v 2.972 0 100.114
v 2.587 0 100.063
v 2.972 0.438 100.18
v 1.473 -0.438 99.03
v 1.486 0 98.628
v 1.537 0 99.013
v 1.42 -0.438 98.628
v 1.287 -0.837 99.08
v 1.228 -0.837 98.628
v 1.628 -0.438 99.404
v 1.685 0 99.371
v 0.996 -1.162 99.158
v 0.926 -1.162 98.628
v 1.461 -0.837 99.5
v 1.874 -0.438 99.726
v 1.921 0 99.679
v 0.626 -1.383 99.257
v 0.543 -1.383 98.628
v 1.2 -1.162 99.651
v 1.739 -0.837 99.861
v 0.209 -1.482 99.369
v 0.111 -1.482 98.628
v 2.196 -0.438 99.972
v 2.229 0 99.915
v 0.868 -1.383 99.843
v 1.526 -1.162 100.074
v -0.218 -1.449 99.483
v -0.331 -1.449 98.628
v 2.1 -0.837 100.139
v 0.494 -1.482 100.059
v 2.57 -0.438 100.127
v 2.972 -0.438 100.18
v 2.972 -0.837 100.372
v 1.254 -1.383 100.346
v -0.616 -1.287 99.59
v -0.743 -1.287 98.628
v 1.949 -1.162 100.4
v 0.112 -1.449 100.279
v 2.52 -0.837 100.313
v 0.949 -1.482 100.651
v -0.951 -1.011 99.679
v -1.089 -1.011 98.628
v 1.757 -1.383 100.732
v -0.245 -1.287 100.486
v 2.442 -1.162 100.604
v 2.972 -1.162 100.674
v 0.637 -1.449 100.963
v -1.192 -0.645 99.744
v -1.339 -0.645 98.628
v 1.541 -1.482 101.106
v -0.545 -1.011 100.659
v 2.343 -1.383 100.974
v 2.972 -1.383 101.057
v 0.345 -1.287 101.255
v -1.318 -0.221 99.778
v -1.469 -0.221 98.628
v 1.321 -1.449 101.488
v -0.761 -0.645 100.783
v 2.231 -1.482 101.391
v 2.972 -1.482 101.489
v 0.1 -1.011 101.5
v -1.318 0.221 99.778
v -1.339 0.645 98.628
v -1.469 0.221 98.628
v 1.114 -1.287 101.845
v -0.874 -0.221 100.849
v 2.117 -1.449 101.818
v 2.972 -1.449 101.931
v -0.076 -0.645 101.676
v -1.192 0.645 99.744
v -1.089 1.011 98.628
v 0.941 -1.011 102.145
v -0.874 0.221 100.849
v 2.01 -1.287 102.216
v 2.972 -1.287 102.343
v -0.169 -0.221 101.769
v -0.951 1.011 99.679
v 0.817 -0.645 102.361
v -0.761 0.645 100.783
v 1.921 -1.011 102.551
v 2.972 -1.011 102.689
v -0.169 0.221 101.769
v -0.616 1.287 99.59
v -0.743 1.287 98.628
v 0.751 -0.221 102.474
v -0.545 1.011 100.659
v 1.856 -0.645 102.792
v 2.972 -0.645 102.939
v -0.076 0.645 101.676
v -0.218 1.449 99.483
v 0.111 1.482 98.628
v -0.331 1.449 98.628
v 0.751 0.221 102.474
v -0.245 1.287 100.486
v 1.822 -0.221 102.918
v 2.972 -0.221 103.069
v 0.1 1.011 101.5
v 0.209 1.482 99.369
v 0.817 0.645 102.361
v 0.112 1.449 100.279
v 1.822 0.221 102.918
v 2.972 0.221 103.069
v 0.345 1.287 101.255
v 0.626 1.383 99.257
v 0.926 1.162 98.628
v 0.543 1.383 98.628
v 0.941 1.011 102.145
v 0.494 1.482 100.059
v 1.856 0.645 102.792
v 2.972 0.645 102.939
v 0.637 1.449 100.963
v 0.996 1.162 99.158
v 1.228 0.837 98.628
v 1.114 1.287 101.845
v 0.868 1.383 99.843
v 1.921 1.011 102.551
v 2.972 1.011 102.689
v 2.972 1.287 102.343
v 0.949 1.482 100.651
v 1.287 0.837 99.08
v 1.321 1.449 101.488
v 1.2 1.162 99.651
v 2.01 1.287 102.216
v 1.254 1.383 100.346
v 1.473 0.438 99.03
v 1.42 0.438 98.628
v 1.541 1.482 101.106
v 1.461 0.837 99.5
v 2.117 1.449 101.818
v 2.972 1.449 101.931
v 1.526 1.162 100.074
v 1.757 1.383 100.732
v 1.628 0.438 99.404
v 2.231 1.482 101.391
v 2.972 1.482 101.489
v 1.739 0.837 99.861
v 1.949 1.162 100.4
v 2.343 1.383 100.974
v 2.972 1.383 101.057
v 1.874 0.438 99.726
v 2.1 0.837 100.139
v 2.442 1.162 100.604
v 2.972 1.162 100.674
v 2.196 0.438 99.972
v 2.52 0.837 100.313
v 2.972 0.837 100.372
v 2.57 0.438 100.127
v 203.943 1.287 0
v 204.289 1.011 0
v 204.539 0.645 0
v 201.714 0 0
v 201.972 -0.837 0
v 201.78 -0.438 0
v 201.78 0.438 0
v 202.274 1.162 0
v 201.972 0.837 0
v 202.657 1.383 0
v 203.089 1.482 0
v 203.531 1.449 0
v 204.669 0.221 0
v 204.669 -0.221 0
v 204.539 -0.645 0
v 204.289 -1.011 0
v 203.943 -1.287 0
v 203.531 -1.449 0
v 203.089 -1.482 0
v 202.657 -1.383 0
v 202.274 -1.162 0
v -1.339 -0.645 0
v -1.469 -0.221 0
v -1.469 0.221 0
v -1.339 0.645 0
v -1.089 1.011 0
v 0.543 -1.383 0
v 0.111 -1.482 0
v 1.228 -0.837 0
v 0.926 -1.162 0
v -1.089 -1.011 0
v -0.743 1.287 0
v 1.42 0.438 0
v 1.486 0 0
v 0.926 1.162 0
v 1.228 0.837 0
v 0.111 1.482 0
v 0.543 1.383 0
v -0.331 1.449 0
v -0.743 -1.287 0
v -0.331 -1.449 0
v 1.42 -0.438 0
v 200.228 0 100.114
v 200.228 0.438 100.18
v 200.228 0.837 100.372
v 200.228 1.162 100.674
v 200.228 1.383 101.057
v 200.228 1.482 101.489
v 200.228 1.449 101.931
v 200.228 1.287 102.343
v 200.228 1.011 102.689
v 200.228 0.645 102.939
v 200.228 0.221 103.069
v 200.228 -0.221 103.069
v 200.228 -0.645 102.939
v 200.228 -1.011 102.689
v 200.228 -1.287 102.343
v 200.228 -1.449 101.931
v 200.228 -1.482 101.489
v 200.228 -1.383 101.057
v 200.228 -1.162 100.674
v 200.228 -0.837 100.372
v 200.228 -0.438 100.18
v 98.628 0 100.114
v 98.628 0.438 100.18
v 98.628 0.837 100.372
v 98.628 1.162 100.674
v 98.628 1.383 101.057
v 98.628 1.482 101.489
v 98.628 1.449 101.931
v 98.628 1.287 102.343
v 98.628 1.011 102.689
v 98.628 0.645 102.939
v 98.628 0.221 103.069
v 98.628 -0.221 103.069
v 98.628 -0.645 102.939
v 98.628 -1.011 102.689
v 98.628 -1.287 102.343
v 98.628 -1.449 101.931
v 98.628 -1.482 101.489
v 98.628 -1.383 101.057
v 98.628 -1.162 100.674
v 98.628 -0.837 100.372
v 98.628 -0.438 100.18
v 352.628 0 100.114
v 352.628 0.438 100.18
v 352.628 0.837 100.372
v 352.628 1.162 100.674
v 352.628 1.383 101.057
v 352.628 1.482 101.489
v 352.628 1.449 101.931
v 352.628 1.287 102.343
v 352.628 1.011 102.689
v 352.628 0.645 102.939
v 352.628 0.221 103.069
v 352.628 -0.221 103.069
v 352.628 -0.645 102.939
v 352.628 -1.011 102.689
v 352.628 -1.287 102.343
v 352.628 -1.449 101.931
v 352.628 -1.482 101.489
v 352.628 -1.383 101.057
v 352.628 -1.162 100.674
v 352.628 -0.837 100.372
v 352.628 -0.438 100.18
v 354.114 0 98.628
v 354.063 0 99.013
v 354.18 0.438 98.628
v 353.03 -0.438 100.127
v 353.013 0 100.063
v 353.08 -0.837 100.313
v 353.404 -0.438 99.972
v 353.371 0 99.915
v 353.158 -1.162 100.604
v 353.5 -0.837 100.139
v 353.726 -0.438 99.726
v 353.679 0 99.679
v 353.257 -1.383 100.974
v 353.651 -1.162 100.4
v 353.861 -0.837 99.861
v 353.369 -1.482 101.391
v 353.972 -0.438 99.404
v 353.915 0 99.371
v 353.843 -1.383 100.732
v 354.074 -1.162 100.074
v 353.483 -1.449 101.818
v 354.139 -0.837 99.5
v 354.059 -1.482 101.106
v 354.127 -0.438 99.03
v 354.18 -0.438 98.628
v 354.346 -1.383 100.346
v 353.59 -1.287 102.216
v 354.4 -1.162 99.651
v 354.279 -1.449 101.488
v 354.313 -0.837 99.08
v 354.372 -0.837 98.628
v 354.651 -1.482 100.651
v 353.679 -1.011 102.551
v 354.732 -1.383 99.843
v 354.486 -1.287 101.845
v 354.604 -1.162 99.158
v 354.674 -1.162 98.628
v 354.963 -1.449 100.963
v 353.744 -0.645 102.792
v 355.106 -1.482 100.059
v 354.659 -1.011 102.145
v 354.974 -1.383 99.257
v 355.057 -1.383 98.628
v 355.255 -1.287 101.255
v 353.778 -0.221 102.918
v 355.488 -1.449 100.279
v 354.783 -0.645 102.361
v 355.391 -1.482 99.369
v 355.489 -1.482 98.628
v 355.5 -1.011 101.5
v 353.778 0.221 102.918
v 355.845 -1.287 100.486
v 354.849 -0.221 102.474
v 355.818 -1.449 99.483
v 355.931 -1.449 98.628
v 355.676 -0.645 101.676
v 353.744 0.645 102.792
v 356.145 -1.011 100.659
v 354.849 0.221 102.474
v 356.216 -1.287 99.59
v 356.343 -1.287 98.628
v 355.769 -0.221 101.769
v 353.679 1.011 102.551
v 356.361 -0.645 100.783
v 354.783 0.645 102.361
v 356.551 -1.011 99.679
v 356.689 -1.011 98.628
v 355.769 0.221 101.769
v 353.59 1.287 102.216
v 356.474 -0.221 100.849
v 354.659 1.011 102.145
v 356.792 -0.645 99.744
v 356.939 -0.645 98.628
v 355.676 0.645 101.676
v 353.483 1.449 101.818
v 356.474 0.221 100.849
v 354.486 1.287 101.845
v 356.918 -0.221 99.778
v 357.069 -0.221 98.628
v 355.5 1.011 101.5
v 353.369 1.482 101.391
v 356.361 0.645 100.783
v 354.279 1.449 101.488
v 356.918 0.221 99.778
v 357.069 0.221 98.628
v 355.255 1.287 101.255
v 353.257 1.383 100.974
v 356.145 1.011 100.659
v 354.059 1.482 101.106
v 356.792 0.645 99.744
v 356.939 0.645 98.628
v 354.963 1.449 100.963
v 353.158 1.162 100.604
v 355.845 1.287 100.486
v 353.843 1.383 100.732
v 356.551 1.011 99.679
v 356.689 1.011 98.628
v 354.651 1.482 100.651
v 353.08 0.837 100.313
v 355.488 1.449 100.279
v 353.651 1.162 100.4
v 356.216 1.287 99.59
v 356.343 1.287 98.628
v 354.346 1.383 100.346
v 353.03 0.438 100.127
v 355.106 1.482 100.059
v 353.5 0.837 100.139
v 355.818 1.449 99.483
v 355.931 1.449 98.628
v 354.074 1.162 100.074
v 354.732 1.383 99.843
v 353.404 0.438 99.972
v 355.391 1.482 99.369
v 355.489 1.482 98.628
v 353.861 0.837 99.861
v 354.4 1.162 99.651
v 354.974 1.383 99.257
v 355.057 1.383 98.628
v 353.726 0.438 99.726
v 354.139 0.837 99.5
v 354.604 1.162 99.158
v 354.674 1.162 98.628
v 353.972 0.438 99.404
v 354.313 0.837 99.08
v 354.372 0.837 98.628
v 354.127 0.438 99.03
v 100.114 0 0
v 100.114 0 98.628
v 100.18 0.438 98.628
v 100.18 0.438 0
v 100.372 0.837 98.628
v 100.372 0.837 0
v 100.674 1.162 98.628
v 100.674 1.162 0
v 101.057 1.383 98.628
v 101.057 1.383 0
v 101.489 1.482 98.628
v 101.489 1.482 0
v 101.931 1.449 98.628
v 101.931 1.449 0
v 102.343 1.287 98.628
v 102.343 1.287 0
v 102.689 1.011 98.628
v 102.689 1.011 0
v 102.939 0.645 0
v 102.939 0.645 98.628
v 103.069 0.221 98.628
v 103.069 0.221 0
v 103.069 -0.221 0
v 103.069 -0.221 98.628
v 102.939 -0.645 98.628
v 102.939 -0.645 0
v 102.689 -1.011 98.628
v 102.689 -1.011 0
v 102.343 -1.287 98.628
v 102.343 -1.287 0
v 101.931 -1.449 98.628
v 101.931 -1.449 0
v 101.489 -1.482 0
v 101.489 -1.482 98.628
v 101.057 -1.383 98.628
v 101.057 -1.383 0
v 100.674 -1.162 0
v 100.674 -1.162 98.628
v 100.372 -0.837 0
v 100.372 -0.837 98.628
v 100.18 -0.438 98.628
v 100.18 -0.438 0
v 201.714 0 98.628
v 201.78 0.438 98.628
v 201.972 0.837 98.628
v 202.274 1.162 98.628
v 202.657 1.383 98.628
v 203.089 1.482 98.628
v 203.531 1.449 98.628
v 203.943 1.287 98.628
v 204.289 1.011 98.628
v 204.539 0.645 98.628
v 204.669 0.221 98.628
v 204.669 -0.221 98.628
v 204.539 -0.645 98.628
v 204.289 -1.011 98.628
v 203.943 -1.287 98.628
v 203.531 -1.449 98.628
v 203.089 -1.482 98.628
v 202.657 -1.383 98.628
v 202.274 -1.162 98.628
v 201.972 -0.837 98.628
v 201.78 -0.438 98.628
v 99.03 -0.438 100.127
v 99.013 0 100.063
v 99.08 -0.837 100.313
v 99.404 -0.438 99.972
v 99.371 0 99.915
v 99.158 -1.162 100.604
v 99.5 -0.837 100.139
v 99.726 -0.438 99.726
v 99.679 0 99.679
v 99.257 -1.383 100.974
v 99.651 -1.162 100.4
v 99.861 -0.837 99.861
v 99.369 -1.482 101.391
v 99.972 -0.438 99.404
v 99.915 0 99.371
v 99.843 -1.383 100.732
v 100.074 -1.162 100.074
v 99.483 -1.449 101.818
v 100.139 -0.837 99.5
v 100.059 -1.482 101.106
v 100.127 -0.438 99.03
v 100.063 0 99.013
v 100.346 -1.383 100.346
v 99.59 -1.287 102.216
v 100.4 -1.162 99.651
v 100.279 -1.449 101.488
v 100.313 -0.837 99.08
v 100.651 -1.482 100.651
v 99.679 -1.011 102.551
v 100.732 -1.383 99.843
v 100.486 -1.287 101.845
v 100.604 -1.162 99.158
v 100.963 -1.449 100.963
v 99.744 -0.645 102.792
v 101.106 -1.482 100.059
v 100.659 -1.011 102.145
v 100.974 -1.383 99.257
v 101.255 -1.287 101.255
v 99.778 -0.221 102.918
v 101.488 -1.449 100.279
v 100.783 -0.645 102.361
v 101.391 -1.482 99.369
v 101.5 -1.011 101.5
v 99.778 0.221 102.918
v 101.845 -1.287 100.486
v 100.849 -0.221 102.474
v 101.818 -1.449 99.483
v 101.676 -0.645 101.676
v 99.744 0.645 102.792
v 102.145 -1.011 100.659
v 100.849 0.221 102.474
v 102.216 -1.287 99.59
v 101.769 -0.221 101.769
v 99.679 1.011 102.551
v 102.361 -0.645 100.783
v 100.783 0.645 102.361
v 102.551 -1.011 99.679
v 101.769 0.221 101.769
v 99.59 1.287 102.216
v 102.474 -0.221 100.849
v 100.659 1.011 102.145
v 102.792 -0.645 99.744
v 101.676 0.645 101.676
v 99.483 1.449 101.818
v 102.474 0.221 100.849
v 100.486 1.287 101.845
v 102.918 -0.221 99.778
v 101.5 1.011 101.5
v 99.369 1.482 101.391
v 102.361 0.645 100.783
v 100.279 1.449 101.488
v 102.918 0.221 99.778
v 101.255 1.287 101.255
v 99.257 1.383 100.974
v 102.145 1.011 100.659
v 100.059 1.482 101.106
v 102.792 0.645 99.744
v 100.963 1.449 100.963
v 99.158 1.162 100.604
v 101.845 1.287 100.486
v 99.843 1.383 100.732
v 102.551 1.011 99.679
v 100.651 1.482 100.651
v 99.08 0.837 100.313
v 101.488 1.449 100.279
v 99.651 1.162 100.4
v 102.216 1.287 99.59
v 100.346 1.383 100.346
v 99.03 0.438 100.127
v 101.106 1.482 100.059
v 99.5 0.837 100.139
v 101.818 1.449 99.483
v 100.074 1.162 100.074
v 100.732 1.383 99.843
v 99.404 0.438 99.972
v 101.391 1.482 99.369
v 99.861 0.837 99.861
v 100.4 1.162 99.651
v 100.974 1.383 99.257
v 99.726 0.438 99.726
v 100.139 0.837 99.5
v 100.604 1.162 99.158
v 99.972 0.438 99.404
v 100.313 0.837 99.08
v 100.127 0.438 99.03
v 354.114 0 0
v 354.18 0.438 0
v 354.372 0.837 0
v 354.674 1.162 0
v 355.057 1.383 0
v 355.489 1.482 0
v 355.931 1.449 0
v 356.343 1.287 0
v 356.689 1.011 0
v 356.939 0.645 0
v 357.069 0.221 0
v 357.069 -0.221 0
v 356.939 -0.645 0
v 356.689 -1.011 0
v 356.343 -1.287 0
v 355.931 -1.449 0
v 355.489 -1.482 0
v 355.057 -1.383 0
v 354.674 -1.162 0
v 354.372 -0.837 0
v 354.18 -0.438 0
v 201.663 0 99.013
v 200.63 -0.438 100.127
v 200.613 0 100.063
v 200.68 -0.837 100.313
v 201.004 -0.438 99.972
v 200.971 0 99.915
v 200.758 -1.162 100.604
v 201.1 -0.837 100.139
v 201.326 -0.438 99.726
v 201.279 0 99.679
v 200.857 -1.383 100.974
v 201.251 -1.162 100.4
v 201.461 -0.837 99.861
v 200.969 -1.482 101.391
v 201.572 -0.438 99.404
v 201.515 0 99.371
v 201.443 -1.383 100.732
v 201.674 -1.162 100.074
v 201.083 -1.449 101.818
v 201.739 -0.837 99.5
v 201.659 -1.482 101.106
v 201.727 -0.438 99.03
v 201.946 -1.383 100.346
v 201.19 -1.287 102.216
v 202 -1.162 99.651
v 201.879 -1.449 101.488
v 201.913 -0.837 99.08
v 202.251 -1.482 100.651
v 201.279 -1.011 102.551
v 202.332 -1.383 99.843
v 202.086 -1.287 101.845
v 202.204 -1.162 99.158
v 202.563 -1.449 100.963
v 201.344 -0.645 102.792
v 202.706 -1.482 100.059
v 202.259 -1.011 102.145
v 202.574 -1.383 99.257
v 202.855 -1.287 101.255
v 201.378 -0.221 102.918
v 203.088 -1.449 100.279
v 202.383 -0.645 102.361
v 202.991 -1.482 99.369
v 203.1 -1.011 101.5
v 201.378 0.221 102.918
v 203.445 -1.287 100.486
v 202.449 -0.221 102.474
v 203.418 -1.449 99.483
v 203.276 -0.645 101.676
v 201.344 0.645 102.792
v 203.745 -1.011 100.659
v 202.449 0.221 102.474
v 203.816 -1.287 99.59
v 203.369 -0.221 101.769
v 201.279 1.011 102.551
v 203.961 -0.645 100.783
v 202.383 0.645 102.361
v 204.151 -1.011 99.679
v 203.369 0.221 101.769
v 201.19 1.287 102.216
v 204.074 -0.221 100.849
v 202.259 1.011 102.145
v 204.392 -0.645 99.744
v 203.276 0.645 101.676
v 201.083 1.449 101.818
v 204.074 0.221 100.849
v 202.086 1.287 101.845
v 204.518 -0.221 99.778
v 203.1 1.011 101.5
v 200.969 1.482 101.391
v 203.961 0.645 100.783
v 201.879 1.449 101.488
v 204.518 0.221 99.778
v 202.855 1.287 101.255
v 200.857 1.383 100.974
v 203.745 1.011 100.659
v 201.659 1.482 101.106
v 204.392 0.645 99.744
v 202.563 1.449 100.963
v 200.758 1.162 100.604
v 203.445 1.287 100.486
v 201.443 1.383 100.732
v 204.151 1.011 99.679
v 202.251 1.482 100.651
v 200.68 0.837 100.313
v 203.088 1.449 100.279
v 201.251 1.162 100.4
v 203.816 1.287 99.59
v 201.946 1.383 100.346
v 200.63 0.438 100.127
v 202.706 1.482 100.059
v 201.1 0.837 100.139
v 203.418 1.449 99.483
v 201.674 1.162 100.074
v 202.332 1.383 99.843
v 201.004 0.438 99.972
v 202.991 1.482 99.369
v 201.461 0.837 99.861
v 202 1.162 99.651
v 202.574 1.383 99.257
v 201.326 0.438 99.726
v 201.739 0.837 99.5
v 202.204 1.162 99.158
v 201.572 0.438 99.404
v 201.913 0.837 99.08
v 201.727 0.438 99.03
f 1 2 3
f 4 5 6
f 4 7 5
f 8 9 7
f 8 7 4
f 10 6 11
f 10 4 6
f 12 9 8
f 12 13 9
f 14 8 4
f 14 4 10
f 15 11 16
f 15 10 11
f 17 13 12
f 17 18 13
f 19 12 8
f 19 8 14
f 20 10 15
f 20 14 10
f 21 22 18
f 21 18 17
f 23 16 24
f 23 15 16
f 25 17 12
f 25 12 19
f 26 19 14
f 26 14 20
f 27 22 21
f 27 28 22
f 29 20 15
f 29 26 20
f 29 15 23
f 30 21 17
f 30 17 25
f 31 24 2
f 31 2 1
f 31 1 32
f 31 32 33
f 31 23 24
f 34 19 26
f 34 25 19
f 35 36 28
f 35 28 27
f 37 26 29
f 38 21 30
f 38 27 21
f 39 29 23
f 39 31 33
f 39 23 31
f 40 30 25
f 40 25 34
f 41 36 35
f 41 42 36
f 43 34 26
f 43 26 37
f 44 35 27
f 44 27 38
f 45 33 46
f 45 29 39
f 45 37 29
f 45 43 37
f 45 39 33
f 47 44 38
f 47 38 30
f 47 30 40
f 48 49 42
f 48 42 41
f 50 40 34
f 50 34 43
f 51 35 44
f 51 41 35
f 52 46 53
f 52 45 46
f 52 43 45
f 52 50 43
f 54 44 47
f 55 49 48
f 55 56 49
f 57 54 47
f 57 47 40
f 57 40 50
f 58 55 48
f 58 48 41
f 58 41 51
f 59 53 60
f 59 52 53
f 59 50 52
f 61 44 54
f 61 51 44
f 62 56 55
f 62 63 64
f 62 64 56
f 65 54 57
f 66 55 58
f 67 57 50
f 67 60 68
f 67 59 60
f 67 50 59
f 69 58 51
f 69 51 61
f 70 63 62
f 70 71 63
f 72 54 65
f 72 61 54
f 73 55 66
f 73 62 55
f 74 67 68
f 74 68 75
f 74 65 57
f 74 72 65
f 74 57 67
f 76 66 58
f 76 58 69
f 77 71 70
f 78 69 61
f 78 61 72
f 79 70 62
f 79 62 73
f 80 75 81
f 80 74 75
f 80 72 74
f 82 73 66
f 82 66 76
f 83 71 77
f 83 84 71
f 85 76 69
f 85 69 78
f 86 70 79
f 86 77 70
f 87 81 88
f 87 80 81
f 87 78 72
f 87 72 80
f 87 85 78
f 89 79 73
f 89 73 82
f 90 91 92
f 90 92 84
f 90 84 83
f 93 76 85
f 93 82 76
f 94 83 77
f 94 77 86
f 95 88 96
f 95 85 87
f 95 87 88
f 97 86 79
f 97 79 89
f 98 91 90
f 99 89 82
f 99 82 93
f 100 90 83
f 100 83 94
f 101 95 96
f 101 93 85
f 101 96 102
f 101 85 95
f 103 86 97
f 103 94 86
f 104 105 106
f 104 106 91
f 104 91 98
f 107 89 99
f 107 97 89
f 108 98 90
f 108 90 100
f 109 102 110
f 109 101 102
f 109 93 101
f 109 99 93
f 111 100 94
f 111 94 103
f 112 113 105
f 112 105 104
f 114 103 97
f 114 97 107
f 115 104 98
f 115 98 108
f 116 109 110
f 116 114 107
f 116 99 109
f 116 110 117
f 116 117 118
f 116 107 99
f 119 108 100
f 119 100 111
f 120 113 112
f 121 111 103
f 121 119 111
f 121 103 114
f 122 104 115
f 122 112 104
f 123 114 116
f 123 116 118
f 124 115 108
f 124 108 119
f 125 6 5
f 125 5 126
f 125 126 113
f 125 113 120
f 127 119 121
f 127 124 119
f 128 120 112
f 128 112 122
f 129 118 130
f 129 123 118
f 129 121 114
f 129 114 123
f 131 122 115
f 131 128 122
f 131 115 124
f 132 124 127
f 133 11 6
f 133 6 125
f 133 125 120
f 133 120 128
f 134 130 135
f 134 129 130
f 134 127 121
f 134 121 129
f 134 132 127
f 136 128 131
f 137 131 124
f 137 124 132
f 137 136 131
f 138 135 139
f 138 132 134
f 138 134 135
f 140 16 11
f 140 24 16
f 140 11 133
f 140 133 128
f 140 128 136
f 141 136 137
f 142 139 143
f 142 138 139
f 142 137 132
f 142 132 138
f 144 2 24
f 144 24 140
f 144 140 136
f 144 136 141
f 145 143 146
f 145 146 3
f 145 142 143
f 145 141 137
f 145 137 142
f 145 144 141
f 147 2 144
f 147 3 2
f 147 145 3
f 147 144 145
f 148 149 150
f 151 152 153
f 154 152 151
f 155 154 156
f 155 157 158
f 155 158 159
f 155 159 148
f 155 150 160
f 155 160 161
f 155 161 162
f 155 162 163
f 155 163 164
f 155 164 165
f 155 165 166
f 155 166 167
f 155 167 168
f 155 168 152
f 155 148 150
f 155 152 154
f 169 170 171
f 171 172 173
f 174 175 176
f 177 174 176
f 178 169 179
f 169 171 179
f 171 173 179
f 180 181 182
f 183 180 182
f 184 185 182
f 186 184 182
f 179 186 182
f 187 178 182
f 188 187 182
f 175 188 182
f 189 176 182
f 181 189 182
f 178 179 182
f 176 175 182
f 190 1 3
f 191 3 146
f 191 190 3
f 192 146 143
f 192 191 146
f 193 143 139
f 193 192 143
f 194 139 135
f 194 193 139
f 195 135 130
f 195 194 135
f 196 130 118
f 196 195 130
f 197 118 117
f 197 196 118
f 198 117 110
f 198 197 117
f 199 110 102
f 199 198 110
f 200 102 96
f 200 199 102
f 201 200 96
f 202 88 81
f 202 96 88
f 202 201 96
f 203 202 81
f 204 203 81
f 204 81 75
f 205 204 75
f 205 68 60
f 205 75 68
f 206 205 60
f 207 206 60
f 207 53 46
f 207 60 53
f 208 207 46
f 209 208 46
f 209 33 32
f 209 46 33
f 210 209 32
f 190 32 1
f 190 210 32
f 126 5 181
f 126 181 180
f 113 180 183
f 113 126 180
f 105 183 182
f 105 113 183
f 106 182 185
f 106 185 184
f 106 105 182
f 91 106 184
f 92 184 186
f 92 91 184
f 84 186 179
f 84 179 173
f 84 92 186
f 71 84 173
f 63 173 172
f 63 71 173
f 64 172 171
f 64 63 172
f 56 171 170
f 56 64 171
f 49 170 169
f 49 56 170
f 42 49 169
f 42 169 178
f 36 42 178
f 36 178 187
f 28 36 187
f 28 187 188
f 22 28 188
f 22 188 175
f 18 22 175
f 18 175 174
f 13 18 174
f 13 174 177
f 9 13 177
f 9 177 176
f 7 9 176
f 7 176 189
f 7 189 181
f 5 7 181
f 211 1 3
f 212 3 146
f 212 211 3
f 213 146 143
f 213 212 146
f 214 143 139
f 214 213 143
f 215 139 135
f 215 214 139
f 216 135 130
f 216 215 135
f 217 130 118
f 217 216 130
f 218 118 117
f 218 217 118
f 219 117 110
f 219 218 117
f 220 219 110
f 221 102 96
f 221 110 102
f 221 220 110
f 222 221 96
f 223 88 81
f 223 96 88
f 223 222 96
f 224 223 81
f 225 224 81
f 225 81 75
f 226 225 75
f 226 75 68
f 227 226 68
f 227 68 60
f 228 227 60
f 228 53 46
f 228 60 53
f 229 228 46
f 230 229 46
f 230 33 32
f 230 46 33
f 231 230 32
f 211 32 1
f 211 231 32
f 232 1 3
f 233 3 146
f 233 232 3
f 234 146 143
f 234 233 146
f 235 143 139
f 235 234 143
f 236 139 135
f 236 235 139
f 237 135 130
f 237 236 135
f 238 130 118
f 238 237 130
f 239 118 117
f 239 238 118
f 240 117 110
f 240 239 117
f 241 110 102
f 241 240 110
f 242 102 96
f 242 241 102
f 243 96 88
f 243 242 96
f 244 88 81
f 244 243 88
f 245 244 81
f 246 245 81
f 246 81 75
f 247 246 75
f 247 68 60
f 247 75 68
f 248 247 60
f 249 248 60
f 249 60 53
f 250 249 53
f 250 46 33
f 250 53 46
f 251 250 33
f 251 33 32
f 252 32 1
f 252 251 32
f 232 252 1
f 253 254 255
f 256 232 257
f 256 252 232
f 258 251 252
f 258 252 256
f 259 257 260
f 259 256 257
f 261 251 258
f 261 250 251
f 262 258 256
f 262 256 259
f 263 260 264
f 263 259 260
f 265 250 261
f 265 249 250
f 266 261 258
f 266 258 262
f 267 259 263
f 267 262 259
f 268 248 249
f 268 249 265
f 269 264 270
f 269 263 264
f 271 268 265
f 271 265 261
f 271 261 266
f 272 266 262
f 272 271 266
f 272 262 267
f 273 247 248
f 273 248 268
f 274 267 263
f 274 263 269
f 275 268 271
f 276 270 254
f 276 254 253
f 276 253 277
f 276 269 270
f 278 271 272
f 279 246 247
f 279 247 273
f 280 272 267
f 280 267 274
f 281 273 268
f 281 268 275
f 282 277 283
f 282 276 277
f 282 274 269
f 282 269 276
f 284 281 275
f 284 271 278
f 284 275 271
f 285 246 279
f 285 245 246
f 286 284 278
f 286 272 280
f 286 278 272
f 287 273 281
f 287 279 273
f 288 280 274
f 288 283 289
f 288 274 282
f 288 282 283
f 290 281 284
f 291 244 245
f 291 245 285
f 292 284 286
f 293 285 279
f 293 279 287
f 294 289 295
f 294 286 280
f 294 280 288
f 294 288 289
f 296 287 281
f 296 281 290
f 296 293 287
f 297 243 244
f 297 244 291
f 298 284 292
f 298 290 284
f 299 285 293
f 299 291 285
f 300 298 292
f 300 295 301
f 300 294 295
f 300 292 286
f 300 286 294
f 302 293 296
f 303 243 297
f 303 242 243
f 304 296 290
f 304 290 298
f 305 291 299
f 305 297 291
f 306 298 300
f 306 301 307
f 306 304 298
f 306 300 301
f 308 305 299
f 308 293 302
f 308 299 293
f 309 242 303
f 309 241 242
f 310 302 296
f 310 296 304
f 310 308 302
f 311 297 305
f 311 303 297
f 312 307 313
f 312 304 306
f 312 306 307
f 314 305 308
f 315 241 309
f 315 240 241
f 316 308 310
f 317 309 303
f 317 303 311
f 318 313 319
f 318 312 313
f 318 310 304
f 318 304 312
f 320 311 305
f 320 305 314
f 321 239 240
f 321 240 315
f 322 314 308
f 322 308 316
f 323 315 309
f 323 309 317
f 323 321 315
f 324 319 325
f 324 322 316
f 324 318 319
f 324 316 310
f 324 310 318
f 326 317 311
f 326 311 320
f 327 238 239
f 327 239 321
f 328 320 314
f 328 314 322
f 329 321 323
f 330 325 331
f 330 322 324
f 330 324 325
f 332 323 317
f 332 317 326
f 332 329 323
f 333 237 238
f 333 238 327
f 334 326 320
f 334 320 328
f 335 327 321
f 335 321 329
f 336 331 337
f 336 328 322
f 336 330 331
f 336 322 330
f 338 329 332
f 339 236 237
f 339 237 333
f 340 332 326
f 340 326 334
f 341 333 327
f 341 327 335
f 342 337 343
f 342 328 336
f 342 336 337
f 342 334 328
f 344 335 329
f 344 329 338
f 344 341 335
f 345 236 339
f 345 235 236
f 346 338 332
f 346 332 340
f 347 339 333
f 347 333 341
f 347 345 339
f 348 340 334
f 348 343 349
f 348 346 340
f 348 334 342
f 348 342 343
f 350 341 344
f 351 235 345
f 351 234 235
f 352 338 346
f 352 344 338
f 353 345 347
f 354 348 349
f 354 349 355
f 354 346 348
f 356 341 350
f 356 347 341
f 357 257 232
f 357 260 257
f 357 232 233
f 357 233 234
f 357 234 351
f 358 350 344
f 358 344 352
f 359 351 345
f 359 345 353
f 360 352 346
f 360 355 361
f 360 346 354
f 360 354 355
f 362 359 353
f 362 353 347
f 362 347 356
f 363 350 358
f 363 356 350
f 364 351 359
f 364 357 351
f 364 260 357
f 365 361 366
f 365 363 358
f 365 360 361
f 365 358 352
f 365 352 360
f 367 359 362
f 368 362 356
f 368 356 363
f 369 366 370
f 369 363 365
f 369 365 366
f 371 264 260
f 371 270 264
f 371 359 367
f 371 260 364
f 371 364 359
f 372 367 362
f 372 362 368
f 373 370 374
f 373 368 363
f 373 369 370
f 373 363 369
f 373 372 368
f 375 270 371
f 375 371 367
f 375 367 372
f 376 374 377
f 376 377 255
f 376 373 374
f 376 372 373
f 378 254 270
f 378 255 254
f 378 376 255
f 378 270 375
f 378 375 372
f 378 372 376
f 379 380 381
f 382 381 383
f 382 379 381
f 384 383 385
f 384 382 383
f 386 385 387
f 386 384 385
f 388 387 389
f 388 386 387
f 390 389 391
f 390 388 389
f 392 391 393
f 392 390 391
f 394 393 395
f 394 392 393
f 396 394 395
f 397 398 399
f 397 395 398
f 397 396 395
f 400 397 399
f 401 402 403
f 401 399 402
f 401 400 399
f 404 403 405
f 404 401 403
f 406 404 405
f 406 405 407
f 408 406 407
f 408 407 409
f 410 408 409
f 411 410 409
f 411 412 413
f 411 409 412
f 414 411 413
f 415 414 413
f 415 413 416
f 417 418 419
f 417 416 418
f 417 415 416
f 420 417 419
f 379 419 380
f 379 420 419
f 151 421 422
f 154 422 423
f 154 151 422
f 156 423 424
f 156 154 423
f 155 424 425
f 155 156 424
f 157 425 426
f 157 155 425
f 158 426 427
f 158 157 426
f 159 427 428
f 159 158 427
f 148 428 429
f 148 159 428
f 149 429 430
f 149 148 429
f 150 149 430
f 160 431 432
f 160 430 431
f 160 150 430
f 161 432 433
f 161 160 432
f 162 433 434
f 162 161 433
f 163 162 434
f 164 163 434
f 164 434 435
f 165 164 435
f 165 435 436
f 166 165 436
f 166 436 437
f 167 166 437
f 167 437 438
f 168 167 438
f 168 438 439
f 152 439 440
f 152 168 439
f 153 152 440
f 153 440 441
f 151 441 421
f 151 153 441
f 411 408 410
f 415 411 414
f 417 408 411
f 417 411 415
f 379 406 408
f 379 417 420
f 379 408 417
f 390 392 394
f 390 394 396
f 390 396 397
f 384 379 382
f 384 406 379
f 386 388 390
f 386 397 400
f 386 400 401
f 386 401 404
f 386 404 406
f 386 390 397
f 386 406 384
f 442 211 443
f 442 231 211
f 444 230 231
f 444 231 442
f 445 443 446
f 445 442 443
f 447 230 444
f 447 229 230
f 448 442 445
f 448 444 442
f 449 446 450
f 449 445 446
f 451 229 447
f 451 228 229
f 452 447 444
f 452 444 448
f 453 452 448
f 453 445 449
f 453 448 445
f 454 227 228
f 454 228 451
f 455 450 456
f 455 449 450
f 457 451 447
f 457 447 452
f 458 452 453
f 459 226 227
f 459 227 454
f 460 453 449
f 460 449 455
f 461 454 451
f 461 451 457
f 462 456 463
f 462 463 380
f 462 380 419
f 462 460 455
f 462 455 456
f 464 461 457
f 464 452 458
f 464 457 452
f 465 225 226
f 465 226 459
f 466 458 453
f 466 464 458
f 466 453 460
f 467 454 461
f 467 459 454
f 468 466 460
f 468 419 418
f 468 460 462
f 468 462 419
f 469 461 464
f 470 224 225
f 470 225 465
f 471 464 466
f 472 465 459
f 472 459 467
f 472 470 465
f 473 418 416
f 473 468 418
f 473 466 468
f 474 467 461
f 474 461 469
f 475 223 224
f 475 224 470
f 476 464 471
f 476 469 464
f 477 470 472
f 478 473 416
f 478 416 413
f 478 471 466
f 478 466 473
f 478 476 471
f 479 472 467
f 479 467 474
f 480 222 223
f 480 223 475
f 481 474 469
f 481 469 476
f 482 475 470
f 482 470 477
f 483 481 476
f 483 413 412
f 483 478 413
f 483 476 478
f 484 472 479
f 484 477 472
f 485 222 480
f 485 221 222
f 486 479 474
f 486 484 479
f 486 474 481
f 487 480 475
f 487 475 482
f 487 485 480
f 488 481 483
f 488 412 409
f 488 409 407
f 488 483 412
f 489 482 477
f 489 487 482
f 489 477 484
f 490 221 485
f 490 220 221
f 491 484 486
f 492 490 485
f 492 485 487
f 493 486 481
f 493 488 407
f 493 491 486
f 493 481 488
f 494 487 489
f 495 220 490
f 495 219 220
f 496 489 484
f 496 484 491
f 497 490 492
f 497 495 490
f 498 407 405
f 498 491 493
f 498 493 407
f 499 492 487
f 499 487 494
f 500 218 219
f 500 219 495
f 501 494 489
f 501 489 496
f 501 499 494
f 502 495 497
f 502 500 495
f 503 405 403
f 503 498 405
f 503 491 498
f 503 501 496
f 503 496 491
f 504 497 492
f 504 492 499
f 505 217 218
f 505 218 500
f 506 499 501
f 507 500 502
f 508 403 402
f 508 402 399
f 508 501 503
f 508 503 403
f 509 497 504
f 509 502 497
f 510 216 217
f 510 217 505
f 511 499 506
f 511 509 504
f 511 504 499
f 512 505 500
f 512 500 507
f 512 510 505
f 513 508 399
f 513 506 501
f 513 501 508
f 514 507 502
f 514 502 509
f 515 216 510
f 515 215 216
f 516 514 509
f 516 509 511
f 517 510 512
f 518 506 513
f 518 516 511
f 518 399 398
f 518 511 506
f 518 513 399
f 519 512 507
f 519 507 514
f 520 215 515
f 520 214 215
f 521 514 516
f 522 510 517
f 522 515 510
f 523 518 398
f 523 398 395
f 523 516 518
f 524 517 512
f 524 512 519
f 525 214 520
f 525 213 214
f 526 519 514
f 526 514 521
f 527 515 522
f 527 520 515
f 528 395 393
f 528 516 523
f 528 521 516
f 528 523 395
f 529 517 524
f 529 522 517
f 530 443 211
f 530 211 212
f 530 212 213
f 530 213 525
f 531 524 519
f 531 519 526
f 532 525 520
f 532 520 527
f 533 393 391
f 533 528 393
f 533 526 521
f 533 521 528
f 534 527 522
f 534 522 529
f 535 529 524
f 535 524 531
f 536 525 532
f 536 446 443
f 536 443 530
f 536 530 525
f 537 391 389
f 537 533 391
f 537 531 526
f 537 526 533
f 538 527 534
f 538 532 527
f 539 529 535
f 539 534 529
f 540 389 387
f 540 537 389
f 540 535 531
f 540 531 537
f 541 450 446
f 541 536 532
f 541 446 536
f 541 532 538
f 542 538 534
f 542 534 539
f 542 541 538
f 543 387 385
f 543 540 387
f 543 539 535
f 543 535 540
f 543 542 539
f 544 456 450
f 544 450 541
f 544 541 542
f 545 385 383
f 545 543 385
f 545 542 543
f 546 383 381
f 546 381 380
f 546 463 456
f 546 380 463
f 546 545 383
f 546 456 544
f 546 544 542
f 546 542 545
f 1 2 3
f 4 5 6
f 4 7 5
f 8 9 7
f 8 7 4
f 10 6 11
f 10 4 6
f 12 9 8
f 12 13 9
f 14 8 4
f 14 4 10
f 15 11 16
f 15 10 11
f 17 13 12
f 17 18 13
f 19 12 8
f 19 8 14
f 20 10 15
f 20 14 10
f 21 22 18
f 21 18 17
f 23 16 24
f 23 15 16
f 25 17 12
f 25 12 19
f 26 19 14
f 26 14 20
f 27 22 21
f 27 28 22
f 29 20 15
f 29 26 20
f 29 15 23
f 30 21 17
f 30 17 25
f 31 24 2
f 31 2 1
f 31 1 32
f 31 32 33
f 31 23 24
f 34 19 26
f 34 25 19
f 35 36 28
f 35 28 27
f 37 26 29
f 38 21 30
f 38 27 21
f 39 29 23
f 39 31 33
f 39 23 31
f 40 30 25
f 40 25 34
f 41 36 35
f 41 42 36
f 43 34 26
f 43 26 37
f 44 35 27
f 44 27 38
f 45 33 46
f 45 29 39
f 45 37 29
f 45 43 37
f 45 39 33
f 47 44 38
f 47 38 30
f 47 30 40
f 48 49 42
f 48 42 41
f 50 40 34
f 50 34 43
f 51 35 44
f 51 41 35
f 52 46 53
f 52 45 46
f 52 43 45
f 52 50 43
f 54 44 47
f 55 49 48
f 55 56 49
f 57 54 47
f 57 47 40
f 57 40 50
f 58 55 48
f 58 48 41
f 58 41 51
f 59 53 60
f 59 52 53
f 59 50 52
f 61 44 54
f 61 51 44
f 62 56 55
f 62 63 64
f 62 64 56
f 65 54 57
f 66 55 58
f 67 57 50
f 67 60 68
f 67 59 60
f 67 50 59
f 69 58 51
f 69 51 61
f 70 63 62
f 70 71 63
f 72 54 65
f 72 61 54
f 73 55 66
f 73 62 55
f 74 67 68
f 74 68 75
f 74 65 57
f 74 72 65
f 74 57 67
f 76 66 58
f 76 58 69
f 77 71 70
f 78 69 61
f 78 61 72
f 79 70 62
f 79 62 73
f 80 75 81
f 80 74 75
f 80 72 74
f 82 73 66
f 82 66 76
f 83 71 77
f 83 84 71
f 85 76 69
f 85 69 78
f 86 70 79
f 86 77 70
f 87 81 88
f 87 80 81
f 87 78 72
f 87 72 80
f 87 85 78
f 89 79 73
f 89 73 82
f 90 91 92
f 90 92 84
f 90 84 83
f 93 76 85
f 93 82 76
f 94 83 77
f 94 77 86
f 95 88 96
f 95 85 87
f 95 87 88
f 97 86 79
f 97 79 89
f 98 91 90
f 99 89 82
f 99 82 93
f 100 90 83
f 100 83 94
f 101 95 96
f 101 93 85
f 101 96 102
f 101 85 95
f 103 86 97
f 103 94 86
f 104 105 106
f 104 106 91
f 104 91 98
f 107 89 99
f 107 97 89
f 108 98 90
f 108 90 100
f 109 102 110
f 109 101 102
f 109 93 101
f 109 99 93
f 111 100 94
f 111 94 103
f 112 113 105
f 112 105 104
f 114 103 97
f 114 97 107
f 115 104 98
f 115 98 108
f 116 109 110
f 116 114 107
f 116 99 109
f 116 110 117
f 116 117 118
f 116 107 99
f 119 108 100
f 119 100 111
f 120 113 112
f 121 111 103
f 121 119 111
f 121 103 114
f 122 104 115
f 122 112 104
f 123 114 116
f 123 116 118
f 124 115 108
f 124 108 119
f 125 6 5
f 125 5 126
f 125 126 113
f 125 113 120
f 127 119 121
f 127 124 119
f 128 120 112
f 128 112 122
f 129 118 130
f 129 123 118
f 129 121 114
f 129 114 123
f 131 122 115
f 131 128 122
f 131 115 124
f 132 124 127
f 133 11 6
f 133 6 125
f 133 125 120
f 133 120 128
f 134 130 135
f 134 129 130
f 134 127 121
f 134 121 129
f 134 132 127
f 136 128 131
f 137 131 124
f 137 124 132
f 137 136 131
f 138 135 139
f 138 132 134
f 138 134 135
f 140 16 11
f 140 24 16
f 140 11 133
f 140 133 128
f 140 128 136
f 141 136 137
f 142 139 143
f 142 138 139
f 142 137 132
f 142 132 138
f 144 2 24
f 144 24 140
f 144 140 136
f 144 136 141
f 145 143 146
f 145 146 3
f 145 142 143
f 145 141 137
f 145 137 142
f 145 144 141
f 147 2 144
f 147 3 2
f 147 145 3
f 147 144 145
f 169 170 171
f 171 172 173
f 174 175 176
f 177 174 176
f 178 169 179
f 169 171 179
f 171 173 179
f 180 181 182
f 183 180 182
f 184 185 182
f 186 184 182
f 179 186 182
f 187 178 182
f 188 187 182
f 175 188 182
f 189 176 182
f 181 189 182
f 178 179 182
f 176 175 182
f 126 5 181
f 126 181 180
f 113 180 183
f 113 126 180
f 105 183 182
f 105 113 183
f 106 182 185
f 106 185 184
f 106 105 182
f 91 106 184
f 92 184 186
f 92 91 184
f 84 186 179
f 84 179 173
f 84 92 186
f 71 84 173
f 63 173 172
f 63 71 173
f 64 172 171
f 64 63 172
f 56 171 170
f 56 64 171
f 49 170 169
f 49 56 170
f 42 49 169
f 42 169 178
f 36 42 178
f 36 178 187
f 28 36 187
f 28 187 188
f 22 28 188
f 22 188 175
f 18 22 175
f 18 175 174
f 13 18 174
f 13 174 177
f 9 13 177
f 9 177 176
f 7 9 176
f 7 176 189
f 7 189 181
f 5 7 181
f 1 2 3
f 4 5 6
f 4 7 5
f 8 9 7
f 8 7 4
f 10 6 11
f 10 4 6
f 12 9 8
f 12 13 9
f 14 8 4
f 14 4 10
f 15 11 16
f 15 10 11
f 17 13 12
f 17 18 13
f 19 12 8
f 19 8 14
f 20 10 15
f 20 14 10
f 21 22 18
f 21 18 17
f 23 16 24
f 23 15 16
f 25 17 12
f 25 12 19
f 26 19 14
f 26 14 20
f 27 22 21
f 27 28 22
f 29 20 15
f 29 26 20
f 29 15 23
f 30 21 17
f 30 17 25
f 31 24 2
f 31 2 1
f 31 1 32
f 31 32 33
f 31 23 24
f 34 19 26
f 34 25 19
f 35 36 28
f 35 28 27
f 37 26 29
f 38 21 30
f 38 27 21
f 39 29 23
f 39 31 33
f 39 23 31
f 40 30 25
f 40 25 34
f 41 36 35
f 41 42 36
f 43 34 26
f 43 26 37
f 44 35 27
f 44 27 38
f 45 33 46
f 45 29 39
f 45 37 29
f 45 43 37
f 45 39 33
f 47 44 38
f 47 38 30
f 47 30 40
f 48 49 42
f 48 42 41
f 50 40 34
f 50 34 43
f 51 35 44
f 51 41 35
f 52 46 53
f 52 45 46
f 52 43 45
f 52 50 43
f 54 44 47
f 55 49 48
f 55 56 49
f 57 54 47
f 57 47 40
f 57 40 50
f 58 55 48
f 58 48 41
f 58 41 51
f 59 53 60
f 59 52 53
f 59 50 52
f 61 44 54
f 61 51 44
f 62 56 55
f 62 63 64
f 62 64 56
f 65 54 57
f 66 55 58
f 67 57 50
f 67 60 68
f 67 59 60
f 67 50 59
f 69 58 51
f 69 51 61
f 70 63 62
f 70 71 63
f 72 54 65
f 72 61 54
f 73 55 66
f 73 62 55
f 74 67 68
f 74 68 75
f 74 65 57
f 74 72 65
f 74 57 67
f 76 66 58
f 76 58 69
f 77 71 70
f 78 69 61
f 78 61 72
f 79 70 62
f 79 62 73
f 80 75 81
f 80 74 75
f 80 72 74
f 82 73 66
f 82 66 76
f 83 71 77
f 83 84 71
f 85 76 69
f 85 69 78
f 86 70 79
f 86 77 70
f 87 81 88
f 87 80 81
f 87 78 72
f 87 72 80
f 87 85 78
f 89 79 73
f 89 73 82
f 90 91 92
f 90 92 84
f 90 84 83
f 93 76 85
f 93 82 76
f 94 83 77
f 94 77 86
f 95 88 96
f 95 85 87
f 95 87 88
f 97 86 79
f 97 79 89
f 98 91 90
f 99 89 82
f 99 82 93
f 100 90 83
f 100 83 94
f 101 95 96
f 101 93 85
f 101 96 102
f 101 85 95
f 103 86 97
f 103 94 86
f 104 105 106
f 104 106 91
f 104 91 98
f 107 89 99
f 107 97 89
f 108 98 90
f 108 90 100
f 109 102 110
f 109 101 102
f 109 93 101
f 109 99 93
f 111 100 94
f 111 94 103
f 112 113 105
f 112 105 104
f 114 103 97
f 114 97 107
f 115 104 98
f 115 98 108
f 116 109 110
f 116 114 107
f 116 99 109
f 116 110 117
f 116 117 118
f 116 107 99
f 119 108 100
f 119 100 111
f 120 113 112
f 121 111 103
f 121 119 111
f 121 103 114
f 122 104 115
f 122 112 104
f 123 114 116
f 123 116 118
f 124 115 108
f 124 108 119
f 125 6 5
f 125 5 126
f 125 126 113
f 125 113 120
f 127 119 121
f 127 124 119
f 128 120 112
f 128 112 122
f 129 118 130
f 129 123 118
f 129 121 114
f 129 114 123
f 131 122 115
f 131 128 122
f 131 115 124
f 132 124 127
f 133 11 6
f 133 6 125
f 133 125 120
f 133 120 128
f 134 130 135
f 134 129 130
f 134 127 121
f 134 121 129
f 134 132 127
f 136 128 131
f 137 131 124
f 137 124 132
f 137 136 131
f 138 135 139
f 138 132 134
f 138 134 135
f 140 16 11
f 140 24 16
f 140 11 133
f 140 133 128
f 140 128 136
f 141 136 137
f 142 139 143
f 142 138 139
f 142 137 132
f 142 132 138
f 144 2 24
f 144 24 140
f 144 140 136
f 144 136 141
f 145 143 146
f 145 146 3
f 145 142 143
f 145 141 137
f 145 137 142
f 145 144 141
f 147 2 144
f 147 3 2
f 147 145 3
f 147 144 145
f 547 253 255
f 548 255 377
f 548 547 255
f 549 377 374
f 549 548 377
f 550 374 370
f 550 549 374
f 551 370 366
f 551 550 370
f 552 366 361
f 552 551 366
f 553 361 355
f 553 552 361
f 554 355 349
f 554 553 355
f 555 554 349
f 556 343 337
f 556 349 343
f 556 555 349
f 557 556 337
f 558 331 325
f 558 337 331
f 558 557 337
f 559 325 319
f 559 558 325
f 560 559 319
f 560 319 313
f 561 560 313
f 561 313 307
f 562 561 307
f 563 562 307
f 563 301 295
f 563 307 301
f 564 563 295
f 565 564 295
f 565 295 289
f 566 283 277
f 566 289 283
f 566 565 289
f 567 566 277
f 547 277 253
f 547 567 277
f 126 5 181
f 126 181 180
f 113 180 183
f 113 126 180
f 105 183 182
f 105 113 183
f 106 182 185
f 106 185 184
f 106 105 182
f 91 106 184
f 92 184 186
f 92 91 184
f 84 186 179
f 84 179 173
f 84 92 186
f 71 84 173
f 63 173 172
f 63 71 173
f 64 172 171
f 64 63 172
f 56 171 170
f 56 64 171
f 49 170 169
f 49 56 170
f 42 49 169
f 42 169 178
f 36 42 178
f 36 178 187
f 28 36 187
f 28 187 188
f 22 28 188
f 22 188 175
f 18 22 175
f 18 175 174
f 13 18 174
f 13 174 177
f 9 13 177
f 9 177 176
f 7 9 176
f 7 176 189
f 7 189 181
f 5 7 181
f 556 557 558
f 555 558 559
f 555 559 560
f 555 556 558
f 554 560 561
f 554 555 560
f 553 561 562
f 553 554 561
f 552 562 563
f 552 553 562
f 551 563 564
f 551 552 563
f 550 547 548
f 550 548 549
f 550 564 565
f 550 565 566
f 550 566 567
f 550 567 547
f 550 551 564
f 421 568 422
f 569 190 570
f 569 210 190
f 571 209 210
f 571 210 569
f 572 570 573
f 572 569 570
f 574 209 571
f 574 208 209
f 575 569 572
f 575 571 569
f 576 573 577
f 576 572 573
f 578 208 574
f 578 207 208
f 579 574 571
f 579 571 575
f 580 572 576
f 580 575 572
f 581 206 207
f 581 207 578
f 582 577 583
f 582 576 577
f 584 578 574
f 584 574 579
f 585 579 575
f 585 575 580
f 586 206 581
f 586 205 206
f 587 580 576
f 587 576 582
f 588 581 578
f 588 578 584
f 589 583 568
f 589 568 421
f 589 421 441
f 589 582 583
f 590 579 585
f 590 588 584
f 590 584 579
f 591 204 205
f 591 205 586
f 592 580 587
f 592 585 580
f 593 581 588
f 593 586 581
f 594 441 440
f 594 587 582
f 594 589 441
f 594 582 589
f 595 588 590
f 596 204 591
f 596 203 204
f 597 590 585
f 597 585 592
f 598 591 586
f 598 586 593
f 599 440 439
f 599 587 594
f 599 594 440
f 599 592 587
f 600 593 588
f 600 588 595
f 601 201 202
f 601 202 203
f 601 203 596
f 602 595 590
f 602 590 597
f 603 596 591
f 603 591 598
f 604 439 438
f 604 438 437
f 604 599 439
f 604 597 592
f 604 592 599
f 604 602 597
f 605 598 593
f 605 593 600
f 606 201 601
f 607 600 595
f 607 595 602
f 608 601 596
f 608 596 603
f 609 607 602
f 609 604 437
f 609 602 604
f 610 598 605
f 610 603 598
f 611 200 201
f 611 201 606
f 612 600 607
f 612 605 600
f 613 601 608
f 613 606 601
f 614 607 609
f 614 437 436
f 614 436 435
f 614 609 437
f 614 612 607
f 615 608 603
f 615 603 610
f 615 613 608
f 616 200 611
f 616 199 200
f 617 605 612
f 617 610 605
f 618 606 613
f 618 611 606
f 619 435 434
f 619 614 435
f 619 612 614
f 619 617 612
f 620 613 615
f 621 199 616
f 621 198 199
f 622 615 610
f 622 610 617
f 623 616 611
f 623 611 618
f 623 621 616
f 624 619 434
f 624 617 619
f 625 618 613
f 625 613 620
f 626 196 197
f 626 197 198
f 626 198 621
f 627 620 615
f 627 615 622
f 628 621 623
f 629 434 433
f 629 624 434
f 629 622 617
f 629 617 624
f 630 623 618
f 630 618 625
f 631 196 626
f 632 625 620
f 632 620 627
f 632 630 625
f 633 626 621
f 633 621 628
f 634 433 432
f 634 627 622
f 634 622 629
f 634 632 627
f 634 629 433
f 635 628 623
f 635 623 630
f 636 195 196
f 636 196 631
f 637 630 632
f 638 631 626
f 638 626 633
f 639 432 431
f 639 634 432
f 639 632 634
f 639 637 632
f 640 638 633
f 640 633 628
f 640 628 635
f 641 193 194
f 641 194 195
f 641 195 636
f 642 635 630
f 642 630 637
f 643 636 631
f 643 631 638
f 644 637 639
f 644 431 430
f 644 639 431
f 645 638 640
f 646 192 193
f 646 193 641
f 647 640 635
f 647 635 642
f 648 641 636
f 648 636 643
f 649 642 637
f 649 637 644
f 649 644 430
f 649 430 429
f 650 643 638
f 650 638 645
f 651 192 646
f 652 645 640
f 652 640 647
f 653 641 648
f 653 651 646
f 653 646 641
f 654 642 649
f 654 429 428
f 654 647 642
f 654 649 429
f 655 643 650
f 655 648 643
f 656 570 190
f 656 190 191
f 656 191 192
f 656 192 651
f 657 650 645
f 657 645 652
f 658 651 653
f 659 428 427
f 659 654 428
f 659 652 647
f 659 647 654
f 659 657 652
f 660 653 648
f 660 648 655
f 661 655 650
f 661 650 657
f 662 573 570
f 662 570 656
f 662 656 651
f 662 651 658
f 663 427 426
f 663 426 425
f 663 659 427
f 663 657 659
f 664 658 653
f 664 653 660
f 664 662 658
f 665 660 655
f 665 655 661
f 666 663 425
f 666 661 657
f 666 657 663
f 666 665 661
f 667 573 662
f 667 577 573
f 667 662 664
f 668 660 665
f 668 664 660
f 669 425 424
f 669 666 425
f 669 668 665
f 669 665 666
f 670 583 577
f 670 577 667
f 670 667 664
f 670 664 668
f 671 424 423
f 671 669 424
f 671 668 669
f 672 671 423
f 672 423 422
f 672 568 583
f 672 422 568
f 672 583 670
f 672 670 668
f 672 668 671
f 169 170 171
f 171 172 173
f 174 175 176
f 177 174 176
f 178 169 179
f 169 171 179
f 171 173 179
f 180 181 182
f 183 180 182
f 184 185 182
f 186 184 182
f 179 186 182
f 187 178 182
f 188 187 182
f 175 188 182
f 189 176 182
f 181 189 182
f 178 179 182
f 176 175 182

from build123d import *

# Parameters (mm, degrees)
F0_R = 1.4859


with BuildPart() as f4:
    # F4: sweep along a path in F1
    with BuildLine(Plane.XZ) as f4_path:
        Line((0, 0), (0, 98.6282))
        ThreePointArc((0, 98.6282), (0.8704200677, 100.7295799323), (2.9718, 101.6))
        Line((2.9718, 101.6), (98.6282, 101.6))
        ThreePointArc((98.6282, 101.6), (100.7295799323, 100.7295799323), (101.6, 98.6282))
        Line((101.6, 98.6282), (101.6, 0))
    # F0 (on Top) → F4 (sweep)
    with BuildSketch(Plane.XY):
        Circle(F0_R)
    sweep(path=f4_path.line)


with BuildPart() as f5:
    # F5: sweep along a path in F2
    with BuildLine(Plane.XZ) as f5_path:
        Line((0, 0), (0, 98.6282))
        ThreePointArc((0, 98.6282), (0.8704200677, 100.7295799323), (2.9718, 101.6))
        Line((2.9718, 101.6), (200.2282, 101.6))
        ThreePointArc((200.2282, 101.6), (202.3295799323, 100.7295799323), (203.2, 98.6282))
        Line((203.2, 98.6282), (203.2, 0))
    # F0 (on Top) → F5 (sweep)
    with BuildSketch(Plane.XY):
        Circle(F0_R)
    sweep(path=f5_path.line)


with BuildPart() as f6:
    # F6: sweep along a path in F3
    with BuildLine(Plane.XZ) as f6_path:
        Line((0, 0), (0, 98.6282))
        ThreePointArc((0, 98.6282), (0.8704200677, 100.7295799323), (2.9718, 101.6))
        Line((2.9718, 101.6), (352.6282, 101.6))
        ThreePointArc((352.6282, 101.6), (354.7295799323, 100.7295799323), (355.6, 98.6282))
        Line((355.6, 98.6282), (355.6, 0))
    # F0 (on Top) → F6 (sweep)
    with BuildSketch(Plane.XY):
        Circle(F0_R)
    sweep(path=f6_path.line)


solid = Compound([f4.part, f5.part, f6.part])
